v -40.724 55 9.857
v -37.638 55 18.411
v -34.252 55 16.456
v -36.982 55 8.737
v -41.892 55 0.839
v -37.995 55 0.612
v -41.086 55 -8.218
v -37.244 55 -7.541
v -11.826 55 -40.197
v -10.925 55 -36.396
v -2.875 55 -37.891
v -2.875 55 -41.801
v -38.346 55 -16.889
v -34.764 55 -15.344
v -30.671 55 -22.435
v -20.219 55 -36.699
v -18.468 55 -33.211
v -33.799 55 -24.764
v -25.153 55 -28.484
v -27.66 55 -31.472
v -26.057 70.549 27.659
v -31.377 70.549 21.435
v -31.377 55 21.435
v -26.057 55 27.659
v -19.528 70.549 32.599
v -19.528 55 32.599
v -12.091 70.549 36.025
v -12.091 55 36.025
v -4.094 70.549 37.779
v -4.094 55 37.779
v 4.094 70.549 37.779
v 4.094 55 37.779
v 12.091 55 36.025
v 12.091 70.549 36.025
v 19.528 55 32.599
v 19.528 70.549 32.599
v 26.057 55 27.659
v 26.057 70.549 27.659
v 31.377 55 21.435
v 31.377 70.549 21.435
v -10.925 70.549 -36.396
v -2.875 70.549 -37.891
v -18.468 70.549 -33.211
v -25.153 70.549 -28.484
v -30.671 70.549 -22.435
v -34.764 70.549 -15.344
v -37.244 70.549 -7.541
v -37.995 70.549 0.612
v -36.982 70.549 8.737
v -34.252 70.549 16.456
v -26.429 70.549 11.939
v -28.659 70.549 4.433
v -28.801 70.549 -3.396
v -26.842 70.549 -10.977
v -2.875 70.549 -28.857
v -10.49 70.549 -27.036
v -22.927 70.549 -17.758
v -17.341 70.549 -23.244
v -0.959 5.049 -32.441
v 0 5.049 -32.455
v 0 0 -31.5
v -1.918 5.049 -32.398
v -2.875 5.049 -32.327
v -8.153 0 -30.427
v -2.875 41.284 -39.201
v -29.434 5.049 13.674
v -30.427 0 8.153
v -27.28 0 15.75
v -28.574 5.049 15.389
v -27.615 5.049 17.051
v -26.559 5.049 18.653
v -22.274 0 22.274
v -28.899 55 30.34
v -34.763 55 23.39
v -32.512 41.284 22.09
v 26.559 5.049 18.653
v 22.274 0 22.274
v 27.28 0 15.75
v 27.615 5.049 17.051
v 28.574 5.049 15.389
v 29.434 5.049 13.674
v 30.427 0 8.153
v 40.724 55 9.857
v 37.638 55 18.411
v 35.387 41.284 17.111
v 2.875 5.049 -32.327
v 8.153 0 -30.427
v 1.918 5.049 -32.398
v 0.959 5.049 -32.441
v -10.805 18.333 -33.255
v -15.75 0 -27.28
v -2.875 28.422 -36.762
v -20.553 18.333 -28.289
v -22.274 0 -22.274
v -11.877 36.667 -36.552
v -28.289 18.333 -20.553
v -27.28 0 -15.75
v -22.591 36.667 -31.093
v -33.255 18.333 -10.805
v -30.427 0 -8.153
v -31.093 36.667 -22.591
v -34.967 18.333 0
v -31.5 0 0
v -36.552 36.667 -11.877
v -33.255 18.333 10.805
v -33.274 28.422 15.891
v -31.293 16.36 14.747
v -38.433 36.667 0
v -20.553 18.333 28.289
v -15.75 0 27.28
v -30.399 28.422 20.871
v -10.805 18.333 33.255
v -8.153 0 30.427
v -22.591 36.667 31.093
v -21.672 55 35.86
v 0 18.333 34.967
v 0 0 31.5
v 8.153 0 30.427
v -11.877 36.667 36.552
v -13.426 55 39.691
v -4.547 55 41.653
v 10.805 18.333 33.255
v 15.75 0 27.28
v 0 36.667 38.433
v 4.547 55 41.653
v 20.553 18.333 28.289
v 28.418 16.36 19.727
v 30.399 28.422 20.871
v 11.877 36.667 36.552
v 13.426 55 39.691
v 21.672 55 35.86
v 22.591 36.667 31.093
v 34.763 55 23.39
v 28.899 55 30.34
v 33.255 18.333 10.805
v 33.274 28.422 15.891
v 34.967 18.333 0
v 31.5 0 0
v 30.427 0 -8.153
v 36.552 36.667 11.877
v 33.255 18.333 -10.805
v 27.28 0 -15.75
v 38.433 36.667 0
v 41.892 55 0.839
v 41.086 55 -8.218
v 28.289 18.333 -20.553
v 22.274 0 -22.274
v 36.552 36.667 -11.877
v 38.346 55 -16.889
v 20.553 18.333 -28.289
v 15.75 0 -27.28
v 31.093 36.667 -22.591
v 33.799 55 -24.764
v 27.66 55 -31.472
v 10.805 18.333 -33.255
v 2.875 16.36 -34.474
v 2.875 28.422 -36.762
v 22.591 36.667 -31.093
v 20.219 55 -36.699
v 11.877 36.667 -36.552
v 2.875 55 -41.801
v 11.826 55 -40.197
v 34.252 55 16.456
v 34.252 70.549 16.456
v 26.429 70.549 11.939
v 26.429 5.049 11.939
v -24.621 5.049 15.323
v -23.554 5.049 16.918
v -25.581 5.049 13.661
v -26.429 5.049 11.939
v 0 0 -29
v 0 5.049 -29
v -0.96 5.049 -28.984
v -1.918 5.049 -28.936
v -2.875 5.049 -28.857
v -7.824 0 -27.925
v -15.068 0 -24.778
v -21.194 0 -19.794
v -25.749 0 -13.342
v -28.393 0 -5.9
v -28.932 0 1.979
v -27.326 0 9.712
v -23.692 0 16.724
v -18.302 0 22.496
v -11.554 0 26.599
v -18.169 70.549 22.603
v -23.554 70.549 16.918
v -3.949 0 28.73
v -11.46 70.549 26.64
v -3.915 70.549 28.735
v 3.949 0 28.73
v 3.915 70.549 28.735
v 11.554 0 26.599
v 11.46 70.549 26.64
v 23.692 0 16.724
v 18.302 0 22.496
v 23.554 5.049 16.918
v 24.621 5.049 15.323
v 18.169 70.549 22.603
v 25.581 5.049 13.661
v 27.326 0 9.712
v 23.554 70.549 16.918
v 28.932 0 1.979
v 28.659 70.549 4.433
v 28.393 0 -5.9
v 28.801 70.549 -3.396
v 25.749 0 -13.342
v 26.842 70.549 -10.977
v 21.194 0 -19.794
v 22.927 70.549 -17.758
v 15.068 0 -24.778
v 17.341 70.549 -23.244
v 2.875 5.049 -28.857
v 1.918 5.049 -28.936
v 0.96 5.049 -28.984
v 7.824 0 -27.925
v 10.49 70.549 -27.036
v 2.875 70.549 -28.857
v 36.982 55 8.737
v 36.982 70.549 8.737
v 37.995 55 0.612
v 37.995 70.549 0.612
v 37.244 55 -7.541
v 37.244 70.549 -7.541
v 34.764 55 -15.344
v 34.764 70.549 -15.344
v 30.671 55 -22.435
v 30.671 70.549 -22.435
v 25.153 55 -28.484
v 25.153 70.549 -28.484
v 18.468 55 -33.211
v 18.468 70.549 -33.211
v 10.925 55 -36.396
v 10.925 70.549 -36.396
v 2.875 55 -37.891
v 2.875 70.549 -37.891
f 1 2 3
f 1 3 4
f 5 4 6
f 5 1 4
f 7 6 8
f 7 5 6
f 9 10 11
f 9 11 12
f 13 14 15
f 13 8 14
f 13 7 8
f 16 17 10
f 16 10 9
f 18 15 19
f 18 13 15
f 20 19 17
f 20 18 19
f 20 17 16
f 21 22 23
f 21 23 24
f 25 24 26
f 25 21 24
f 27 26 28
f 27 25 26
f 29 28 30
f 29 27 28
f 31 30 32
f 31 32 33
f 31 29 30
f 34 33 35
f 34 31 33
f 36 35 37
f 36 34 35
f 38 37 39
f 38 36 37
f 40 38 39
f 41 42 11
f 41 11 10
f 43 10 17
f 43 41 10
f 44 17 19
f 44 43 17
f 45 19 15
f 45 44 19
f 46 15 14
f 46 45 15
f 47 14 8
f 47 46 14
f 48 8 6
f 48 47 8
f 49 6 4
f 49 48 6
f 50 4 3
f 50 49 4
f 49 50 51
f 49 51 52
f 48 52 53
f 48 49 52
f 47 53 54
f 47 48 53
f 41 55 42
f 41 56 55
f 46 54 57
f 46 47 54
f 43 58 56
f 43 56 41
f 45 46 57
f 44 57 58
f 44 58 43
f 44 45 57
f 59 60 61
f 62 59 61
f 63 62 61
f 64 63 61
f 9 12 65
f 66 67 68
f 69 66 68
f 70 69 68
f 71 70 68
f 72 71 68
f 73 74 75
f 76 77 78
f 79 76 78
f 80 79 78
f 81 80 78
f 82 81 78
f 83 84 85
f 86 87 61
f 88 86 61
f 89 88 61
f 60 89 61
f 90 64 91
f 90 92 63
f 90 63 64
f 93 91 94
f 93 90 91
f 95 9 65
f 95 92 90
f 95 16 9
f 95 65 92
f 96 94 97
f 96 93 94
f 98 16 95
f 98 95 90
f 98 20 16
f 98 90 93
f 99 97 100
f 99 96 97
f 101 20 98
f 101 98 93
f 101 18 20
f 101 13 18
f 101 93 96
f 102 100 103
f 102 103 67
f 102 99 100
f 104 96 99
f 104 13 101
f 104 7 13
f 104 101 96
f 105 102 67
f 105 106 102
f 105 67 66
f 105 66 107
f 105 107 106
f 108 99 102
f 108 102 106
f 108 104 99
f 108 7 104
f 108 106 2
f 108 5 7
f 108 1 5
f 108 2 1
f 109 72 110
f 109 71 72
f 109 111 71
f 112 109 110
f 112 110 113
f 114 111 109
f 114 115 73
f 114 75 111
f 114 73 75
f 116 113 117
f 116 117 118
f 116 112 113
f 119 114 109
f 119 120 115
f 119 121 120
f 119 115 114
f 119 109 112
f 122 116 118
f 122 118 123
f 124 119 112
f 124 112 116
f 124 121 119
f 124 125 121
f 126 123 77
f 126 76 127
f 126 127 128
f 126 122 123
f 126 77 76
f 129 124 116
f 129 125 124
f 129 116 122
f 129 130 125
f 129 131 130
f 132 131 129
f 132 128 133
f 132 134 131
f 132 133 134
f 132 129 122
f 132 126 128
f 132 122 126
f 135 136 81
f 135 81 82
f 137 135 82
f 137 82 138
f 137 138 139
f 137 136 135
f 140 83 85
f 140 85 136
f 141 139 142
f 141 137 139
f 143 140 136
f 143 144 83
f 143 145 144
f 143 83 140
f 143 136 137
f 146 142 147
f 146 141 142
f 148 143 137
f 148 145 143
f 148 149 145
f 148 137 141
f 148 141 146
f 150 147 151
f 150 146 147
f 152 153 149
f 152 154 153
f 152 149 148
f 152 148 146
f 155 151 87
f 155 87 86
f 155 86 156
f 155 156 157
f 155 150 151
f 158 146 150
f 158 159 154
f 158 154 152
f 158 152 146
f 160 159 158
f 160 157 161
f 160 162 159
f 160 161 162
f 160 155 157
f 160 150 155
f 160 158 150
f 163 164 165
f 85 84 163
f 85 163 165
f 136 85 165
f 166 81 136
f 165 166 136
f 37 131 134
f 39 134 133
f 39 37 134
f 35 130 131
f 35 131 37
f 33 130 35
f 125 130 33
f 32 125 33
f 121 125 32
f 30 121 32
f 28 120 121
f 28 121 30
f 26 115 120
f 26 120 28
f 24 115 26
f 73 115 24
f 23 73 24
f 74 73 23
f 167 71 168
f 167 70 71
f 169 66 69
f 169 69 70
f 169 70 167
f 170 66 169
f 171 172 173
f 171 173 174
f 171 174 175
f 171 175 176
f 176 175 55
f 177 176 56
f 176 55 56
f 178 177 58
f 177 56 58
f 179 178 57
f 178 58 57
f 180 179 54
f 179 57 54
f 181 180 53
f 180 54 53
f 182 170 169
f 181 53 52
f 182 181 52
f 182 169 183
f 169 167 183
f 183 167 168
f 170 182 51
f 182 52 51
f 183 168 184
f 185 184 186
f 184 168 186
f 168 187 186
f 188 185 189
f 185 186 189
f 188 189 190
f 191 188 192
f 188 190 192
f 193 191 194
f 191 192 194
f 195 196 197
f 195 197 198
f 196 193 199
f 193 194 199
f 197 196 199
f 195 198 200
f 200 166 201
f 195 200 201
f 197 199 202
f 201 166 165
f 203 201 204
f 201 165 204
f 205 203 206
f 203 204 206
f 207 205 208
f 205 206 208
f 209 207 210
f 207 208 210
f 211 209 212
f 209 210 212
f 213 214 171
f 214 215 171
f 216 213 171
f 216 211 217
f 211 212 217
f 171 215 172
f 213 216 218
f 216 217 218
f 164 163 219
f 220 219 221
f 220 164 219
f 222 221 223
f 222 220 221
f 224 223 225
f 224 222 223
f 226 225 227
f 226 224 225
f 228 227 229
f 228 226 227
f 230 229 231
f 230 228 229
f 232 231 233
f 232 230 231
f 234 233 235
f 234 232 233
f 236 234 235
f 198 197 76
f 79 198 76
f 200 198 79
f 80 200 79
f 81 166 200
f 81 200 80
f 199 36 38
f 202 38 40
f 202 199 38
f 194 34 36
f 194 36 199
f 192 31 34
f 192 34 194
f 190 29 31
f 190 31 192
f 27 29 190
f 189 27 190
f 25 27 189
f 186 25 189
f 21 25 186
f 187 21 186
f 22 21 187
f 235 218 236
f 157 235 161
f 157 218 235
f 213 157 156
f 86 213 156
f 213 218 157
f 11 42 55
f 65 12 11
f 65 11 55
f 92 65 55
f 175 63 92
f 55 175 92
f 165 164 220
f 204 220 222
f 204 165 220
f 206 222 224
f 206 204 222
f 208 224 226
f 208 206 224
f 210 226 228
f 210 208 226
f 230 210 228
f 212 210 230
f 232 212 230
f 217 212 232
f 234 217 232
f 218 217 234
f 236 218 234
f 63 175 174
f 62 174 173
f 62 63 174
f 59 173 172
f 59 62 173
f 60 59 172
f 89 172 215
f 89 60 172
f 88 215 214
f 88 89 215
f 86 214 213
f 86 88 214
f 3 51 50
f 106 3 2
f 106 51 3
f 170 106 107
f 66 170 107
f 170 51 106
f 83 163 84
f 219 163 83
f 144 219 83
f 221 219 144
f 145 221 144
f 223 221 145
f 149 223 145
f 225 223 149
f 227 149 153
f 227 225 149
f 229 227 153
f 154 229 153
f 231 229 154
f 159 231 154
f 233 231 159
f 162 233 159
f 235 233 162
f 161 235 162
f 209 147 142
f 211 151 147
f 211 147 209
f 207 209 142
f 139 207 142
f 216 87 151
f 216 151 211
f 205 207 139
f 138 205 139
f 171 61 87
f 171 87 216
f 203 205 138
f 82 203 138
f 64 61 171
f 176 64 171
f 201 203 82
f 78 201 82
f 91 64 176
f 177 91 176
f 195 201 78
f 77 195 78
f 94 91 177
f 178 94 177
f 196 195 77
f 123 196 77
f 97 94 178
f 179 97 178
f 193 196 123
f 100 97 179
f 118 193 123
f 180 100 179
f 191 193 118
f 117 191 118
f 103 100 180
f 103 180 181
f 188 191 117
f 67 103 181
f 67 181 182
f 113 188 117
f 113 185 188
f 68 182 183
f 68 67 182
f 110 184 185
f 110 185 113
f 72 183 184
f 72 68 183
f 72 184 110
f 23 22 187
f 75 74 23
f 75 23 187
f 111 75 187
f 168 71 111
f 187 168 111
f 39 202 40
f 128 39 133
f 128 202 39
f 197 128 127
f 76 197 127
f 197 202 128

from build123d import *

# Parameters (mm, degrees)
CUT_EXTRUDE_THIN1_START = -65.5
CUT_EXTRUDE_THIN1_DEPTH = 65.5


# Read off the part's stored shape, not the designer's step: Cut-Extrude-Thin1
with BuildPart() as part:
    # Sketch3 → Revolve1 (revolve)
    with BuildSketch(Plane.XY, mode=Mode.PRIVATE) as revolve1_sk:
        Polygon((-38, 55), (-38, 70.548970685), (-29, 70.548970685), (-29, 55), (-29, 0), (-31.5, 0), (-41.9, 55), align=None)
    revolve(revolve1_sk.sketch.rotate(Axis((0, 0, 0), (0, 1, 0)), 270), axis=Axis((0, 0, 0), (0, 1, 0)))

    # Cut-Extrude-Thin1 outline → Cut-Extrude-Thin1 (cut)
    with BuildSketch(Plane(origin=(0, 70.548970685, 0), x_dir=(1, 0, 0), z_dir=(0, 1, 0)).offset(CUT_EXTRUDE_THIN1_START)):
        Polygon((2.875, 4.979646072), (2.875, 43), (-2.875, 43), (-2.875, 4.979646072), (0, 3.319764048), align=None)
        Polygon((5.75, 0), (2.875, -1.659882024), (2.875, -4.979646072), (23.55351401, -16.918391702), (34.763443099, -23.390447279), (37.551270189, -25), (39, -25), (39, -19.19689645), (37.638443099, -18.410801207), (26.42851401, -11.93874563), align=None)
        Polygon((-2.875, -4.979646072), (-2.875, -1.659882024), (-5.75, 0), (-26.42851401, -11.93874563), (-37.638443099, -18.410801207), (-39, -19.19689645), (-39, -25), (-37.551270189, -25), (-34.763443099, -23.390447279), (-23.55351401, -16.918391702), align=None)
    extrude(amount=CUT_EXTRUDE_THIN1_DEPTH, mode=Mode.SUBTRACT)


solid = part.part
